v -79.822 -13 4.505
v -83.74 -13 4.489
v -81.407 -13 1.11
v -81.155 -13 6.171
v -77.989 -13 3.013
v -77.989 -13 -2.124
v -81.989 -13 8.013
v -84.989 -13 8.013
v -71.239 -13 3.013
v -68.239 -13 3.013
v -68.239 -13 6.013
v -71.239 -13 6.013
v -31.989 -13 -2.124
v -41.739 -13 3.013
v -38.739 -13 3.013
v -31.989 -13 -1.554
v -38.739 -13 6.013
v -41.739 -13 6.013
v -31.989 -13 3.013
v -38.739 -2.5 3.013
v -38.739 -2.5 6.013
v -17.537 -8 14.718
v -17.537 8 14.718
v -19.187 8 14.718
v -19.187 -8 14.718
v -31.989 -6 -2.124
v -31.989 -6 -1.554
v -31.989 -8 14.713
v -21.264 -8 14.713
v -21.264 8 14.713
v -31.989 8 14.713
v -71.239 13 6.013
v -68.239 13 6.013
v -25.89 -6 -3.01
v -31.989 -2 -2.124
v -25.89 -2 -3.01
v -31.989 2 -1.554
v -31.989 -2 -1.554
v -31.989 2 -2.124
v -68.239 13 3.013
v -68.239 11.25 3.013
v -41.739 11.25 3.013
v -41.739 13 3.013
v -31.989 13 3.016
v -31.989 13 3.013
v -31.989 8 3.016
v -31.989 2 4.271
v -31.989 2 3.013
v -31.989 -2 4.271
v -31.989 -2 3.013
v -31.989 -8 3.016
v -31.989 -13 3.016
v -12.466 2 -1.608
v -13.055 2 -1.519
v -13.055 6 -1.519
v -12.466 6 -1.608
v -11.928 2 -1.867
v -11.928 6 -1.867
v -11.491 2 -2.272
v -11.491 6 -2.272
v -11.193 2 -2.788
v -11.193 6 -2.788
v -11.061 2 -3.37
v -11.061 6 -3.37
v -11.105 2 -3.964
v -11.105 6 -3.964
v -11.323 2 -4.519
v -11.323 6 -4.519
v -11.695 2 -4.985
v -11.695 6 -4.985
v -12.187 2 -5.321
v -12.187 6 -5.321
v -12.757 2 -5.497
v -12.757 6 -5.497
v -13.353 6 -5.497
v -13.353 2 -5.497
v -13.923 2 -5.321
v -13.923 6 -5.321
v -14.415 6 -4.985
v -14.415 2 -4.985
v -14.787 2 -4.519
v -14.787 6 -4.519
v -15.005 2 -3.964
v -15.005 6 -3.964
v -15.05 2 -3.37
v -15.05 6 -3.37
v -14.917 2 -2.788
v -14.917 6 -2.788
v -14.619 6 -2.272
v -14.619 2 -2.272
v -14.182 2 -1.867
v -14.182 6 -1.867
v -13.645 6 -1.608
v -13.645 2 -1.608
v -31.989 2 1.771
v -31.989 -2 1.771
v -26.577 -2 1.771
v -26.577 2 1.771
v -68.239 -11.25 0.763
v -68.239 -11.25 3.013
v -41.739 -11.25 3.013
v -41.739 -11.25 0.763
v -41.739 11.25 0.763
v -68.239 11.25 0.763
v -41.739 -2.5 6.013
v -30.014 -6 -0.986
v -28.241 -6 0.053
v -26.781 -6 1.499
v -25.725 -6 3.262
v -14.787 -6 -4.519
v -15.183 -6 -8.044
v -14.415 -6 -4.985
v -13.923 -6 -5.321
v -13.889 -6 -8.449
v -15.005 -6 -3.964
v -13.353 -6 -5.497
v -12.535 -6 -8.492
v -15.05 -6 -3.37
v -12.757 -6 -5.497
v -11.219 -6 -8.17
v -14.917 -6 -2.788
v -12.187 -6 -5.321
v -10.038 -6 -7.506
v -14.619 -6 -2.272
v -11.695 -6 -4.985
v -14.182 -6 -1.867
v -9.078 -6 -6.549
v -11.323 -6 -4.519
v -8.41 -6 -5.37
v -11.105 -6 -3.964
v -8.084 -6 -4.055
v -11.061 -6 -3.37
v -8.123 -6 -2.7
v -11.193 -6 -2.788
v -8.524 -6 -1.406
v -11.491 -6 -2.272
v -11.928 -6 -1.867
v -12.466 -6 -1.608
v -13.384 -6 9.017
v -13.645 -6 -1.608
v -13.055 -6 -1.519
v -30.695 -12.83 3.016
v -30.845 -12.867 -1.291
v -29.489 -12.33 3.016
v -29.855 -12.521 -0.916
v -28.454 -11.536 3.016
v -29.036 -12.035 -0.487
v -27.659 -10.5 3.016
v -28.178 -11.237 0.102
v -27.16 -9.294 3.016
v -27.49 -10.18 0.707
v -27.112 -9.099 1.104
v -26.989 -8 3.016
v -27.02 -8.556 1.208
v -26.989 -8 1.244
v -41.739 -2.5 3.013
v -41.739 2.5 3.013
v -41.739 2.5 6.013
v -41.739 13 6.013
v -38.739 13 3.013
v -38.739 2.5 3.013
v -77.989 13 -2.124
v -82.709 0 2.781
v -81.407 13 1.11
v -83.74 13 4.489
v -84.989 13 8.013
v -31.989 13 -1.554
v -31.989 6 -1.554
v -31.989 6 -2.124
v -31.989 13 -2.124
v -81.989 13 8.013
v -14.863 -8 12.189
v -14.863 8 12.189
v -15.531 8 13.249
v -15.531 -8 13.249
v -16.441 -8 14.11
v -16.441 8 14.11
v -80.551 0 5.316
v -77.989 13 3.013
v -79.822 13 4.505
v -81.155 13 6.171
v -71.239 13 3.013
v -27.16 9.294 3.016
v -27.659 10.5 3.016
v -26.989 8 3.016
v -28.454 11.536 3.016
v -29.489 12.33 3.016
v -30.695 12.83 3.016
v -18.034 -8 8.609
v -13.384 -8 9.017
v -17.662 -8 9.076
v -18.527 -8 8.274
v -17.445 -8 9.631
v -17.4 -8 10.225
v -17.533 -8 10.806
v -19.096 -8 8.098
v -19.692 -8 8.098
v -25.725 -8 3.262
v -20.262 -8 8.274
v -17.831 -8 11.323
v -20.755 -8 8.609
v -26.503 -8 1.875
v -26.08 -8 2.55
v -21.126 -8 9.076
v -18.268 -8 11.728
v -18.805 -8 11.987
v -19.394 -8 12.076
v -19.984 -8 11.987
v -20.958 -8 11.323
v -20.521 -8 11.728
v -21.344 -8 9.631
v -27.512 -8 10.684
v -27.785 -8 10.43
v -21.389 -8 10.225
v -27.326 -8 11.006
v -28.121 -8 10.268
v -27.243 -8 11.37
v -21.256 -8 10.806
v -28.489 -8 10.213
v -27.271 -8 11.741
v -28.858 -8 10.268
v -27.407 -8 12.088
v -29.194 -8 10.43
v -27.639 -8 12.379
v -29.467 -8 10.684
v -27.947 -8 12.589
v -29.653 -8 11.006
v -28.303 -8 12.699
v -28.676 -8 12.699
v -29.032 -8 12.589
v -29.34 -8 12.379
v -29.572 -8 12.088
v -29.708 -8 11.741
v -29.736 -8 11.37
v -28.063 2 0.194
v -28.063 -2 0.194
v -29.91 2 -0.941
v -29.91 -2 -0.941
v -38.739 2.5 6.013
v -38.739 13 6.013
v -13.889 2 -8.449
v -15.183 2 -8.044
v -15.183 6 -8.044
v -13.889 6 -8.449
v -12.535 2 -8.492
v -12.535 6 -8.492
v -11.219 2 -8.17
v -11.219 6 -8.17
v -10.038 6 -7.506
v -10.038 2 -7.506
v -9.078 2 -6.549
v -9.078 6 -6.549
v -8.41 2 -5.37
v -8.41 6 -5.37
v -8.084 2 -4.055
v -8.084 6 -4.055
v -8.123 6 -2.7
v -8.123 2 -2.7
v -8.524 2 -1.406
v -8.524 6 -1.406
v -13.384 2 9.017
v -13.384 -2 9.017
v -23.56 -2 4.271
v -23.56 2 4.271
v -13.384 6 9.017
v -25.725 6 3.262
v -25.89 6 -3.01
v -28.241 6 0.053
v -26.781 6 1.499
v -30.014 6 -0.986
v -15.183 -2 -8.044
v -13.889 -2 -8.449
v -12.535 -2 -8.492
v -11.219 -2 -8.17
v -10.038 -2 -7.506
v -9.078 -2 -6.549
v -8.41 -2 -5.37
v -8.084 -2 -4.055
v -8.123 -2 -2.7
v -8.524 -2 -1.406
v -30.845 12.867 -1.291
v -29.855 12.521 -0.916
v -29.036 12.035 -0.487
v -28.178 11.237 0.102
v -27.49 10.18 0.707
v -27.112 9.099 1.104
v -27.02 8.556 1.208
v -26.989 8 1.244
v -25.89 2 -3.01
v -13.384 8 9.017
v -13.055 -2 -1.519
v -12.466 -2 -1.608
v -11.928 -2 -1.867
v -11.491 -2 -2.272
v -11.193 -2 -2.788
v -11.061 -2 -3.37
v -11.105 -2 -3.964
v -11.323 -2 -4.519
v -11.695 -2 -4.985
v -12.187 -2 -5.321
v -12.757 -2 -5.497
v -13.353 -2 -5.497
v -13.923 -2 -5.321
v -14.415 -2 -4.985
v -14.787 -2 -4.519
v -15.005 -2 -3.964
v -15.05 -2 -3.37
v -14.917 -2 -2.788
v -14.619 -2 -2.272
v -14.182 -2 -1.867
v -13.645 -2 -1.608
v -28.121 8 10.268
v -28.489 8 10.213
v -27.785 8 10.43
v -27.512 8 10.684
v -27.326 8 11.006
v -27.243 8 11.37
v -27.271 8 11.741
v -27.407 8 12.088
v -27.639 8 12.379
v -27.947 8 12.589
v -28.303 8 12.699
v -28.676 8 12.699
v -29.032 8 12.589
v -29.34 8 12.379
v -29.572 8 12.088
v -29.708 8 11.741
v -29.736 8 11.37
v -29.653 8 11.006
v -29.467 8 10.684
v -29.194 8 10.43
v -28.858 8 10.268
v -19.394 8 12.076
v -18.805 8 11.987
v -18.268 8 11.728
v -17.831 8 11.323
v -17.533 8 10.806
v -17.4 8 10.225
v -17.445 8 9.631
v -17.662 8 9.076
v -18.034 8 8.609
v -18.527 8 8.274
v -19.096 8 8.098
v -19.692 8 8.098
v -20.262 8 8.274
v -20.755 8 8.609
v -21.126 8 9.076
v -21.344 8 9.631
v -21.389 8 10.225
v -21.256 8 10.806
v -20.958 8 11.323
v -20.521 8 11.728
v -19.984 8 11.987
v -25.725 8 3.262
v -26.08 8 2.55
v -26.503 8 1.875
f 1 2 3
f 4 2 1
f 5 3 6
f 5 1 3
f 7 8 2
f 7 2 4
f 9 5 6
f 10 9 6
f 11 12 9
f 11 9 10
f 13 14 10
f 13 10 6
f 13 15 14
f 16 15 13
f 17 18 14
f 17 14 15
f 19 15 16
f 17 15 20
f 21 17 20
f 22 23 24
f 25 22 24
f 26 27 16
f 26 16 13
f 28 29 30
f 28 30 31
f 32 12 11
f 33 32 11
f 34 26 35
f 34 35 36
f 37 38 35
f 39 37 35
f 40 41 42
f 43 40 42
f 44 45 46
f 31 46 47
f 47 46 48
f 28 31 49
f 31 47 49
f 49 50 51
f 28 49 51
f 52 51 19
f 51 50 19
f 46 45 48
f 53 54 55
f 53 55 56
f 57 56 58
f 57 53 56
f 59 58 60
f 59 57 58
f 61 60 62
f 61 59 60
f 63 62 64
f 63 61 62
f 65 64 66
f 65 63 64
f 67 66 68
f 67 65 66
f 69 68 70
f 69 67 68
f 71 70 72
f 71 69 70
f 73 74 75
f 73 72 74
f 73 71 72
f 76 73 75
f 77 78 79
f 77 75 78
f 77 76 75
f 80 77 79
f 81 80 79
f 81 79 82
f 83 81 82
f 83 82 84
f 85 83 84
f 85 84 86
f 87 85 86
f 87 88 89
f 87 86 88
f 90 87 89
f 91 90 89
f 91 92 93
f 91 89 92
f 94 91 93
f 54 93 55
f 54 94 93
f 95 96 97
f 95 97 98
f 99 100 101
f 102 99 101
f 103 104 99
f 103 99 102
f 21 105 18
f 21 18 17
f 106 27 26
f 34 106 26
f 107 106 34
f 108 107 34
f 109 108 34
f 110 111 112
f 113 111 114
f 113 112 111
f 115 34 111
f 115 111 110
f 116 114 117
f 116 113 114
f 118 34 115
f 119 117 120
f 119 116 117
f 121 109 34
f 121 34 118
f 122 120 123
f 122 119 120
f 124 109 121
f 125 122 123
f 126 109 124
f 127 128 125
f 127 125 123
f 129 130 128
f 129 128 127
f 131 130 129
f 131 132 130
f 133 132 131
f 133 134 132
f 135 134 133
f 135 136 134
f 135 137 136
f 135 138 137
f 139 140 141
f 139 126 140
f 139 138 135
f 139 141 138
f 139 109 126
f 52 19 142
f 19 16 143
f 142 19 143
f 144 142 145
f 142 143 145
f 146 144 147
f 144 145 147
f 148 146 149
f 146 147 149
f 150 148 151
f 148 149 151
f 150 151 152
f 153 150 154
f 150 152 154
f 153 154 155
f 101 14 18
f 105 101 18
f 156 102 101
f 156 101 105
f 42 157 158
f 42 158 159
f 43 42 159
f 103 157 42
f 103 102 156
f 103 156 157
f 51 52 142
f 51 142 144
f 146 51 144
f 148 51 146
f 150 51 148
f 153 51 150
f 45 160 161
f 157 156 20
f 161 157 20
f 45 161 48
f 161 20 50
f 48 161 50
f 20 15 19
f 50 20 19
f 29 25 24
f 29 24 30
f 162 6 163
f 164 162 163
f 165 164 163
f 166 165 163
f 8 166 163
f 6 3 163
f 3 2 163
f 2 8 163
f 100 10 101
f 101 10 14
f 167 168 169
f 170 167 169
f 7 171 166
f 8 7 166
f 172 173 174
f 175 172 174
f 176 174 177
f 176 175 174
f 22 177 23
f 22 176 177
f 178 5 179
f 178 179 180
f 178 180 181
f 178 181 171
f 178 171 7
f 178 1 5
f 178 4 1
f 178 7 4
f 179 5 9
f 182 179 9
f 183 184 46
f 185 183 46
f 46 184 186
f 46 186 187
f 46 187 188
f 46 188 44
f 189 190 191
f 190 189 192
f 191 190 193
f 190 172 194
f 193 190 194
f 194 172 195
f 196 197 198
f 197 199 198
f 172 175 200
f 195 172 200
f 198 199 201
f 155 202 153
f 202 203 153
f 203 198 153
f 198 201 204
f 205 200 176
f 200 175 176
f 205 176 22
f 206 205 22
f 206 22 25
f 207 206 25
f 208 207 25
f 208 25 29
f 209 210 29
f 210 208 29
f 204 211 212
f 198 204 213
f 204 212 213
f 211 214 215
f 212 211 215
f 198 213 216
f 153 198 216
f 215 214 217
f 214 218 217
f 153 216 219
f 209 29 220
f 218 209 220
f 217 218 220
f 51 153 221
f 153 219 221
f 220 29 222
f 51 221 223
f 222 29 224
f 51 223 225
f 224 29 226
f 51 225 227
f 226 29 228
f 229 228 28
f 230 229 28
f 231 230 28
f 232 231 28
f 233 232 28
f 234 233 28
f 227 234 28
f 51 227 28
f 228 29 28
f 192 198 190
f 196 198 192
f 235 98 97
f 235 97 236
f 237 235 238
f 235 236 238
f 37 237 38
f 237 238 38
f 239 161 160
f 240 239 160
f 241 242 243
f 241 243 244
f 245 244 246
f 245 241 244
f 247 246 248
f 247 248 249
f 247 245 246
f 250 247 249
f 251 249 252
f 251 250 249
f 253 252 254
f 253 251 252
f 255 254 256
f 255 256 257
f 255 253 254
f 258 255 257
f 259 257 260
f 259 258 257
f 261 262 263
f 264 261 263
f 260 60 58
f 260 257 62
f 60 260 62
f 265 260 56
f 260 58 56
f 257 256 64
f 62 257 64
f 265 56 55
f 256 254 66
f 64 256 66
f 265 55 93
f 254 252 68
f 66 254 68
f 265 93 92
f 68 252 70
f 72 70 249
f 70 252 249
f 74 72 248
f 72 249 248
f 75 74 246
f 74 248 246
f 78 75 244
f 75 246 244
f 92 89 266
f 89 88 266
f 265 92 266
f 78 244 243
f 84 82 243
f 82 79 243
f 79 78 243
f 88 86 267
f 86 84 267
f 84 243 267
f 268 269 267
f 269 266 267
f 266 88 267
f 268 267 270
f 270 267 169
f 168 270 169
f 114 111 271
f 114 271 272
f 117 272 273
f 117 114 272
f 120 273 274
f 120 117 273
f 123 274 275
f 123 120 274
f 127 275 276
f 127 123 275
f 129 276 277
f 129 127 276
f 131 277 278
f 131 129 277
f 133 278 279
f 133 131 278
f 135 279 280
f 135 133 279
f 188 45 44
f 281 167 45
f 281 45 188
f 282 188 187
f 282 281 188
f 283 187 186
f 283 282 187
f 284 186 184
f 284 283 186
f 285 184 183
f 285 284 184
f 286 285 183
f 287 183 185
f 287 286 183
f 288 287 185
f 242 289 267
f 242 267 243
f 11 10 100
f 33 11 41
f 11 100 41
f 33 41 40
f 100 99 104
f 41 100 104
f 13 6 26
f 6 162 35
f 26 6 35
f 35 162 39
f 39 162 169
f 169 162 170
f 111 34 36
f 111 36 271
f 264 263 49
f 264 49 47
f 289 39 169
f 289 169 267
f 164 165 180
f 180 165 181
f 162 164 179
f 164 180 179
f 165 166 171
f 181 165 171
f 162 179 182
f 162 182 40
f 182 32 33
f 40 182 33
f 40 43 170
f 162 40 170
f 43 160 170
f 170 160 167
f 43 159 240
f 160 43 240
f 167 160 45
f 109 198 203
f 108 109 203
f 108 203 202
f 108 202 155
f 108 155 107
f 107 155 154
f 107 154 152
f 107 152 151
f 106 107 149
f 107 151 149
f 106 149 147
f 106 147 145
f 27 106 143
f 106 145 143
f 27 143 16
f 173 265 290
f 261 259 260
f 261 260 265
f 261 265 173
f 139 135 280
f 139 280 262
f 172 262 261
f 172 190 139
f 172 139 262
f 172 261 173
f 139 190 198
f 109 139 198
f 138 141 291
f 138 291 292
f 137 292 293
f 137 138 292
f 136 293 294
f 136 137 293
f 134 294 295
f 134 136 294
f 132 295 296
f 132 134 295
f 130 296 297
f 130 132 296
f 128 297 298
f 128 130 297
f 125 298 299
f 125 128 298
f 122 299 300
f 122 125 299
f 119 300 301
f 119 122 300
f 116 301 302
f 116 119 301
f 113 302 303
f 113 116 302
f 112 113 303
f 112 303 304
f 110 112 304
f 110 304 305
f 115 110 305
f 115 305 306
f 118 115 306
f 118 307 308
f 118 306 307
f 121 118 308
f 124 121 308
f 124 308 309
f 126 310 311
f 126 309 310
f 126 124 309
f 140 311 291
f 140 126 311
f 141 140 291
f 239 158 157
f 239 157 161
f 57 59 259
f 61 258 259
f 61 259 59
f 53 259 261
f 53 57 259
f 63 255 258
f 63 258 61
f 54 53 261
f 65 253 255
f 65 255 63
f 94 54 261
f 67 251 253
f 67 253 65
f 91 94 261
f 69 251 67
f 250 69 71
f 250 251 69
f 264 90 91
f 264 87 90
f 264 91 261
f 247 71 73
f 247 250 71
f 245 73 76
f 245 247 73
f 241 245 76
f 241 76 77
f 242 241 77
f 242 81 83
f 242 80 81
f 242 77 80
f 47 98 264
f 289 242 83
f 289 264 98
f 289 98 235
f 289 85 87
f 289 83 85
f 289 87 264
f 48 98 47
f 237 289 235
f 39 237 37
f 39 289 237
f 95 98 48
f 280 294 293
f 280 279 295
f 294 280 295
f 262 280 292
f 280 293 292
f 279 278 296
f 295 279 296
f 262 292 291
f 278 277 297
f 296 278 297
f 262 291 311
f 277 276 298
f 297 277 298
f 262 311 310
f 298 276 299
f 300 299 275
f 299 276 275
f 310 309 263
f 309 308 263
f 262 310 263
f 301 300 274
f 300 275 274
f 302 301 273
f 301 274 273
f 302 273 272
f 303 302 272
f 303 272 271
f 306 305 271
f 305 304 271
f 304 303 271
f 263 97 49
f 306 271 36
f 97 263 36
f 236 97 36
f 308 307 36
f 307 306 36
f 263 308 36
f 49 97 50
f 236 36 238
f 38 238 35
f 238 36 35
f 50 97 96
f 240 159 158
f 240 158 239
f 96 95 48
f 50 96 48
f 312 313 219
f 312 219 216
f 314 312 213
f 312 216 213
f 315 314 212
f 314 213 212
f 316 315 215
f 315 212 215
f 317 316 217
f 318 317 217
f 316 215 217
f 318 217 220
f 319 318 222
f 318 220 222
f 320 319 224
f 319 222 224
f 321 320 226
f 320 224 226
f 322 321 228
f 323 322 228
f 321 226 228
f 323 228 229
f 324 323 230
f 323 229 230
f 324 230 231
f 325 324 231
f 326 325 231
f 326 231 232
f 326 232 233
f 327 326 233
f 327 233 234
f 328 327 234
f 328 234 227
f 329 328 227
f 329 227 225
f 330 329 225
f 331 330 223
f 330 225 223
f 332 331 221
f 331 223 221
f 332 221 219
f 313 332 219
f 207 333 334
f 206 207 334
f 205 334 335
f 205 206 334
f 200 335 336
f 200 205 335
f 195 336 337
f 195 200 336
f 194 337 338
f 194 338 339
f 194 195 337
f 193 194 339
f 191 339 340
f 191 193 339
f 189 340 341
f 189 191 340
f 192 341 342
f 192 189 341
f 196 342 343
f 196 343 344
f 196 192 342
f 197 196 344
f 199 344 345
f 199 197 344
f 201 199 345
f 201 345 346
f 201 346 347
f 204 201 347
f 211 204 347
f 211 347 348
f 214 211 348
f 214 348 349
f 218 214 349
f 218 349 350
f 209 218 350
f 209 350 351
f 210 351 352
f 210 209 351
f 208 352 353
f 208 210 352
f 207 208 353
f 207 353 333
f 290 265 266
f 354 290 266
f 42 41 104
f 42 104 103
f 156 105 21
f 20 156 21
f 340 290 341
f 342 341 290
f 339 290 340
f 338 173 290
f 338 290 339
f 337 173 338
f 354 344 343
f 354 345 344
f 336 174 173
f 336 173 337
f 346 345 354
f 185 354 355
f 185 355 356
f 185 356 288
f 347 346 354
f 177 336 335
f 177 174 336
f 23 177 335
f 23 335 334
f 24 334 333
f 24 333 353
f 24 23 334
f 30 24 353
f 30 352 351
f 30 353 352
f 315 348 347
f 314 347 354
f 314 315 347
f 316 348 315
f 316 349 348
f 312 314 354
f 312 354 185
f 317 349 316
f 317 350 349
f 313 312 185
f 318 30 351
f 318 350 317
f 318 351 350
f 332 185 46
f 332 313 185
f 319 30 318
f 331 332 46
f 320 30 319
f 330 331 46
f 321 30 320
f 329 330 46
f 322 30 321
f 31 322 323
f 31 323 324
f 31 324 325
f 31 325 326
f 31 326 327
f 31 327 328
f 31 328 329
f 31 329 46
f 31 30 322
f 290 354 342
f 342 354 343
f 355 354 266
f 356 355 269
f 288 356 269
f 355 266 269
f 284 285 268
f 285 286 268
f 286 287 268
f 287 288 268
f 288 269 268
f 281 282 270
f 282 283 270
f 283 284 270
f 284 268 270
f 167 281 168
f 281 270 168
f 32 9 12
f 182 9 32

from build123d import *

# Parameters (mm, degrees)
BOSS_EXTRUDE1_DEPTH      = 8
BOSS_EXTRUDE1_DEPTH_BACK = 8
SKETCH2_R                = 2
CUT_EXTRUDE1_DEPTH       = 2
CUT_EXTRUDE2_START       = -2
CUT_EXTRUDE2_DEPTH       = 2
BOSS_EXTRUDE4_DEPTH      = 16
CUT_EXTRUDE4_DEPTH       = 2
CUT_EXTRUDE4_DEPTH_BACK  = 2
BOSS_EXTRUDE6_DEPTH      = 13
BOSS_EXTRUDE6_DEPTH_BACK = 13
SKETCH12_W               = 46
SKETCH12_H               = 5.136814738
SKETCH13_R               = 1.25
CUT_EXTRUDE5_DEPTH       = 16
BOSS_EXTRUDE7_DEPTH      = 26
SKETCH15_W               = 3
SKETCH15_H               = 26
BOSS_EXTRUDE8_DEPTH      = 3
SKETCH20_W               = 2.5
SKETCH20_H               = 4
CUT_EXTRUDE8_DEPTH       = 57.520887153
BOSS_EXTRUDE9_DEPTH      = 5.14
CUT_EXTRUDE9_START       = -5.14
CUT_EXTRUDE9_DEPTH       = 5.14
BOSS_EXTRUDE10_DEPTH     = 5.14
CUT_EXTRUDE10_DEPTH      = 5.14
SKETCH25_W               = 26.5
SKETCH25_H               = 22.5
CUT_EXTRUDE11_DEPTH      = 2.25
SKETCH26_W               = 3
SKETCH26_H               = 5
CUT_EXTRUDE12_DEPTH      = 3


with BuildPart() as part:
    # Sketch2 → Boss-Extrude1 (new, two sides: drawn at the far end of the back side and taken through both)
    with BuildSketch(Plane(origin=(0, 0, 0), x_dir=(1, 0, 0), z_dir=(0, 1, 0)).offset(-BOSS_EXTRUDE1_DEPTH_BACK)):
        with BuildLine():
            Line((-8.523572923, 1.405956139), (-14.862846849, -12.188660667))
            ThreePointArc((-14.862846849, -12.188660667), (-15.958655574, -13.708165939), (-17.536798633, -14.717699254))
            Line((-17.536798633, -14.717699254), (-19.186952062, -14.717699254))
            Line((-19.186952062, -14.717699254), (-21.263787389, -14.712954143))
            Line((-21.263787389, -14.712954143), (-31.98936925, -14.712954143))
            ThreePointArc((-31.98936925, -14.712954143), (-25.026485616, -6.579447275), (-31.98936925, 1.554059594))
            Line((-31.98936925, 1.554059594), (-31.98936925, 2.123860595))
            Line((-31.98936925, 2.123860595), (-25.889500724, 3.009865365))
            Line((-25.889500724, 3.009865365), (-15.1825186, 8.043883417))
            ThreePointArc((-15.1825186, 8.043883417), (-9.525170989, 7.060165556), (-8.523572923, 1.405956139))
        make_face()
        with Locations(Location((-19.394385785, -10.075569358, 0), (0, 0, 270))):
            Circle(SKETCH2_R, mode=Mode.SUBTRACT)
        with Locations(Location((-13.055111858, 3.519047448, 0), (0, 0, 270))):
            Circle(SKETCH2_R, mode=Mode.SUBTRACT)
    extrude(amount=BOSS_EXTRUDE1_DEPTH + BOSS_EXTRUDE1_DEPTH_BACK)

    # Sketch3 → Cut-Extrude1 (cut)
    with BuildSketch(Plane.XZ.offset(8)):
        with BuildLine():
            Line((-13.383682933, 9.016583412), (-36.019194906, -1.538529167))
            Line((-36.019194906, -1.538529167), (-25.889500724, -3.009865365))
            Line((-25.889500724, -3.009865365), (-15.1825186, -8.043883417))
            ThreePointArc((-15.1825186, -8.043883417), (-9.525170989, -7.060165556), (-8.523572923, -1.405956139))
            Line((-8.523572923, -1.405956139), (-13.383682933, 9.016583412))
        make_face()
    extrude(amount=-CUT_EXTRUDE1_DEPTH, mode=Mode.SUBTRACT)

    # Sketch4 → Cut-Extrude2 (cut)
    with BuildSketch(Plane(origin=(0, 8, 0), x_dir=(1, 0, 0), z_dir=(0, 1, 0)).offset(CUT_EXTRUDE2_START)):
        with BuildLine():
            Line((-13.383682933, -9.016583412), (-36.019194906, 1.538529167))
            Line((-36.019194906, 1.538529167), (-25.889500724, 3.009865365))
            Line((-25.889500724, 3.009865365), (-15.1825186, 8.043883417))
            ThreePointArc((-15.1825186, 8.043883417), (-9.525170989, 7.060165556), (-8.523572923, 1.405956139))
            Line((-8.523572923, 1.405956139), (-13.383682933, -9.016583412))
        make_face()
    extrude(amount=CUT_EXTRUDE2_DEPTH, mode=Mode.SUBTRACT)

    # Sketch7 → Boss-Extrude4 (add)
    with BuildSketch(Plane.XZ.offset(8)):
        with BuildLine():
            Line((-31.98936925, -1.554059594), (-31.98936925, 14.712954143))
            ThreePointArc((-31.98936925, 14.712954143), (-26.036622944, 10.530440134), (-25.724576966, 3.261930016))
            ThreePointArc((-25.724576966, 3.261930016), (-28.241329009, 0.053085809), (-31.98936925, -1.554059594))
        make_face()
    extrude(amount=-BOSS_EXTRUDE4_DEPTH)

    # Sketch10 → Cut-Extrude4 (cut, two sides: drawn at the far end of the back side and taken through both)
    with BuildSketch(Plane(origin=(0, 0, 0), x_dir=(1, 0, 0), z_dir=(0, 1, 0)).offset(-CUT_EXTRUDE4_DEPTH_BACK)):
        with BuildLine():
            Line((-25.889500724, 3.009865365), (-15.1825186, 8.043883417))
            ThreePointArc((-15.1825186, 8.043883417), (-9.525170989, 7.060165556), (-8.523572923, 1.405956139))
            Line((-8.523572923, 1.405956139), (-13.383682933, -9.016583412))
            Line((-13.383682933, -9.016583412), (-25.724576966, -3.261930016))
            ThreePointArc((-25.724576966, -3.261930016), (-28.241329009, -0.053085809), (-31.98936925, 1.554059594))
            Line((-31.98936925, 1.554059594), (-31.98936925, 2.123860595))
            Line((-31.98936925, 2.123860595), (-25.889500724, 3.009865365))
        make_face()
    extrude(amount=CUT_EXTRUDE4_DEPTH + CUT_EXTRUDE4_DEPTH_BACK, mode=Mode.SUBTRACT)

    # Sketch12 → Boss-Extrude6 (add, two sides: drawn at the far end of the back side and taken through both)
    with BuildSketch(Plane(origin=(0, 0, 0), x_dir=(1, 0, 0), z_dir=(0, 1, 0)).offset(-BOSS_EXTRUDE6_DEPTH_BACK)):
        with Locations((-54.98936925, -0.444546774)):
            Rectangle(SKETCH12_W, SKETCH12_H)
    extrude(amount=BOSS_EXTRUDE6_DEPTH + BOSS_EXTRUDE6_DEPTH_BACK)

    # Sketch13 → Cut-Extrude5 (cut)
    with BuildSketch(Plane.XZ.offset(8)):
        with Locations(Location((-28.48936925, 11.462954143, 0), (0, 0, 270))):
            Circle(SKETCH13_R)
    extrude(amount=-CUT_EXTRUDE5_DEPTH, mode=Mode.SUBTRACT)

    # Sketch14 → Boss-Extrude7 (add)
    with BuildSketch(Plane.XZ.offset(13)):
        with BuildLine():
            Line((-81.98936925, 8.012954143), (-84.98936925, 8.012954143))
            add(Edge.make_bspline(
                [(-77.98936925, -2.123860595), (-83.929409171, 2.617289227), (-84.98936925, 8.012954143)],
                knots=[0, 0, 0, 0.697154263, 0.697154263, 0.697154263], degree=2))
            Line((-77.98936925, -2.123860595), (-77.98936925, 3.012954143))
            add(Edge.make_bspline(
                [(-77.98936925, 3.012954143), (-81.112416602, 5.119010403), (-81.98936925, 8.012954143)],
                knots=[0, 0, 0, 0.561523676, 0.561523676, 0.561523676], degree=2))
        make_face()
    extrude(amount=-BOSS_EXTRUDE7_DEPTH)

    # Sketch15 → Boss-Extrude8 (add)
    with BuildSketch(Plane.XY.offset(3.012954143)):
        with Locations((-40.23936925, 0)):
            Rectangle(SKETCH15_W, SKETCH15_H)
        with Locations((-69.73936925, 0)):
            Rectangle(SKETCH15_W, SKETCH15_H)
    extrude(amount=BOSS_EXTRUDE8_DEPTH)

    # Sketch20 → Cut-Extrude8 (cut, through all)
    with BuildSketch(Plane.ZY.offset(31.98936925)):
        with Locations((3.021305608, 0)):
            Rectangle(SKETCH20_W, SKETCH20_H)
    extrude(amount=-CUT_EXTRUDE8_DEPTH, mode=Mode.SUBTRACT)

    # Sketch21 → Boss-Extrude9 (add)
    with BuildSketch(Plane(origin=(0, 0, -2.123860595), x_dir=(-1, 0, 0), z_dir=(0, 0, -1))):
        with BuildLine():
            Line((26.98936925, 8), (31.98936925, 8))
            Line((31.98936925, 8), (31.98936925, 13))
            ThreePointArc((31.98936925, 13), (28.453835344, 11.535533906), (26.98936925, 8))
        make_face()
    extrude(amount=-BOSS_EXTRUDE9_DEPTH)

    # Sketch22 → Cut-Extrude9 (cut)
    with BuildSketch(Plane(origin=(0, 13, 0), x_dir=(1, 0, 0), z_dir=(0, 1, 0)).offset(CUT_EXTRUDE9_START)):
        with BuildLine():
            Line((-31.98936925, 2.123860595), (-31.98936925, 1.554059594))
            ThreePointArc((-31.98936925, 1.554059594), (-29.238037233, 0.603941382), (-26.98936925, -1.244313143))
            Line((-26.98936925, -1.244313143), (-26.98936925, 2.123860595))
            Line((-26.98936925, 2.123860595), (-31.98936925, 2.123860595))
        make_face()
    extrude(amount=CUT_EXTRUDE9_DEPTH, mode=Mode.SUBTRACT)

    # Sketch23 → Boss-Extrude10 (add)
    with BuildSketch(Plane(origin=(0, 0, -2.123860595), x_dir=(-1, 0, 0), z_dir=(0, 0, -1))):
        with BuildLine():
            Line((31.98936925, -8), (31.98936925, -13))
            ThreePointArc((31.98936925, -13), (28.453835344, -11.535533906), (26.98936925, -8))
            Line((26.98936925, -8), (31.98936925, -8))
        make_face()
    extrude(amount=-BOSS_EXTRUDE10_DEPTH)

    # Sketch24 → Cut-Extrude10 (cut)
    with BuildSketch(Plane.XZ.offset(13)):
        with BuildLine():
            Line((-31.98936925, -1.554059594), (-31.98936925, -2.123860595))
            Line((-31.98936925, -2.123860595), (-25.837669131, -2.123860595))
            Line((-25.837669131, -2.123860595), (-25.837669131, 3.016139405))
            ThreePointArc((-25.837669131, 3.016139405), (-26.35642668, 2.093115722), (-26.98936925, 1.244313143))
            ThreePointArc((-26.98936925, 1.244313143), (-29.238037233, -0.603941382), (-31.98936925, -1.554059594))
        make_face()
    extrude(amount=-CUT_EXTRUDE10_DEPTH, mode=Mode.SUBTRACT)

    # Sketch25 → Cut-Extrude11 (cut)
    with BuildSketch(Plane.XY.offset(3.012954143)):
        with Locations((-54.98936925, 0)):
            Rectangle(SKETCH25_W, SKETCH25_H)
    extrude(amount=-CUT_EXTRUDE11_DEPTH, mode=Mode.SUBTRACT)

    # Sketch26 → Cut-Extrude12 (cut)
    with BuildSketch(Plane.XY.offset(6.012954143)):
        with Locations((-40.23936925, 0)):
            Rectangle(SKETCH26_W, SKETCH26_H)
    extrude(amount=-CUT_EXTRUDE12_DEPTH, mode=Mode.SUBTRACT)


solid = part.part
